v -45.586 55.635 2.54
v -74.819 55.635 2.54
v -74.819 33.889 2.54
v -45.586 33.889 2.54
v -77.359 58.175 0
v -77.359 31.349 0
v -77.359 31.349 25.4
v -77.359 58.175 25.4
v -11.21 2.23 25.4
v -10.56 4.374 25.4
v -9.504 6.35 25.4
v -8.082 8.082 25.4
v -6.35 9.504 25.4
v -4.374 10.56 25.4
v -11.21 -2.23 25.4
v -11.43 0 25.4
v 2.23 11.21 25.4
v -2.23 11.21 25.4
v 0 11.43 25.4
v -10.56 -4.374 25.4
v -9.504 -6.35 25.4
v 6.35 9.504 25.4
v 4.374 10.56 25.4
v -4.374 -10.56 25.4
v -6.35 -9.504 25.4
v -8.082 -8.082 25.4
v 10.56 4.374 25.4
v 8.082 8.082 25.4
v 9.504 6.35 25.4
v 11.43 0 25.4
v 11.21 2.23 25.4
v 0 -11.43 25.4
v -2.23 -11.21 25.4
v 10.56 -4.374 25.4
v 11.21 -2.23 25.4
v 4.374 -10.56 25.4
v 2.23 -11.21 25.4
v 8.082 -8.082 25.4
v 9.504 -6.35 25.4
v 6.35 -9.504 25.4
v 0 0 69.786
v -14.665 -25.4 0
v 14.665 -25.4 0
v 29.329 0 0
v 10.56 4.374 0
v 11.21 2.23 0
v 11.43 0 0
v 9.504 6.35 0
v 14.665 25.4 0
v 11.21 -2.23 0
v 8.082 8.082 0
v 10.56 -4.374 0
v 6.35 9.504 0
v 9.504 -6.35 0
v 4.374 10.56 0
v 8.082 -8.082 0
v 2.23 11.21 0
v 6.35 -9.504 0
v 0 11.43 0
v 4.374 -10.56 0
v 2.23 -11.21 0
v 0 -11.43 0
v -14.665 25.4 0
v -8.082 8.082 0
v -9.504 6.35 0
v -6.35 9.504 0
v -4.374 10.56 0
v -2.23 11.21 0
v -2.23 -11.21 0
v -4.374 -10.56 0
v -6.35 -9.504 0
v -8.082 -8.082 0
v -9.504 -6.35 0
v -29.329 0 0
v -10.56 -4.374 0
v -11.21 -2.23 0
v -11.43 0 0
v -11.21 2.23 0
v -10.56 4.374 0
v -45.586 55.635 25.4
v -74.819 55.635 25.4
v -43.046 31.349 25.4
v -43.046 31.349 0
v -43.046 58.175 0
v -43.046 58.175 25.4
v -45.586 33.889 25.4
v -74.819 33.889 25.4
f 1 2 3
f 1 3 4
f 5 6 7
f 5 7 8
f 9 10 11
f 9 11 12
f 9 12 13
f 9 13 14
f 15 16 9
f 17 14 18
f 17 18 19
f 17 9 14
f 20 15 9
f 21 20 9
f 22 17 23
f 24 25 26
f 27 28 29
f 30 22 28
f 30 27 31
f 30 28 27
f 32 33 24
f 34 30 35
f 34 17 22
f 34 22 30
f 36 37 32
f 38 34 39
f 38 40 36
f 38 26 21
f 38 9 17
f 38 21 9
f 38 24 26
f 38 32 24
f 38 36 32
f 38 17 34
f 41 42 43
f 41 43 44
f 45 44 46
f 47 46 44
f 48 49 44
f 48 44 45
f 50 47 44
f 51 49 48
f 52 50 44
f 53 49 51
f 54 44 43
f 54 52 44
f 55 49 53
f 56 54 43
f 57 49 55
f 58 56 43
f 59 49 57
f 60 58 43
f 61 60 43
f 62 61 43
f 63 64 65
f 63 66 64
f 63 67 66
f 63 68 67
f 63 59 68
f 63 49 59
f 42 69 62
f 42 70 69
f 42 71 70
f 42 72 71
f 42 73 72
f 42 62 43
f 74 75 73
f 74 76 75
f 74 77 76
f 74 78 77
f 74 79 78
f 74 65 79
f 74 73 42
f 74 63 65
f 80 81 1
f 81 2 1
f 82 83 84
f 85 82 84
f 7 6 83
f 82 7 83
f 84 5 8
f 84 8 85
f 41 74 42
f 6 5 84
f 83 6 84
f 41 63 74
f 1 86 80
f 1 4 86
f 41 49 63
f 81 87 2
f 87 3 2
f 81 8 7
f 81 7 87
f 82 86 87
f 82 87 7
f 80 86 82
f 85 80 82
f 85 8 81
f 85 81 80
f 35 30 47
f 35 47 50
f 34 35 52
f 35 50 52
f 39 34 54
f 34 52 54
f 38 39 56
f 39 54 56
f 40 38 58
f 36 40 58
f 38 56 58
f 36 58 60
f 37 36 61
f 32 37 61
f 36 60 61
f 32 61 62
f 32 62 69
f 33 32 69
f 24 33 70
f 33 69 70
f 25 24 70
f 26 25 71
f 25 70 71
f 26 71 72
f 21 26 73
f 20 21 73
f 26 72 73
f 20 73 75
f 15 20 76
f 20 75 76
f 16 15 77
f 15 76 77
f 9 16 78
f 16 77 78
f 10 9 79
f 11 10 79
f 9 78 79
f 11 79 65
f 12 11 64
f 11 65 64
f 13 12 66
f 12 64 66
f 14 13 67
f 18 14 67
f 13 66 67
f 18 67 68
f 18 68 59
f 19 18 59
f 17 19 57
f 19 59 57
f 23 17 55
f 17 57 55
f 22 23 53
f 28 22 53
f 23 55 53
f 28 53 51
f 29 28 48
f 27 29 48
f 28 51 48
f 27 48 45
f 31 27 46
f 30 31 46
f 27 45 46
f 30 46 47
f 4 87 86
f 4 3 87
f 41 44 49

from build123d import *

# Parameters (mm, degrees)
F0_W     = 50.8
F0_H     = 50.8
F1_DEPTH = 53.975
F5_R     = 11.43
F6_DEPTH = 25.4
F7_W     = 34.3122780323
F7_H     = 26.8259719014
F8_DEPTH = 25.4
F9_T     = -2.54


# Not quite as in the source:
# - an extrude whose draft closes it to a point is written as a loft to that point


with BuildPart() as f1:
    # F0 (on Front) → F1 (new body, symmetric)
    with BuildSketch(Plane.XZ):
        with Locations((-25.4, 25.4)):
            Rectangle(F0_W, F0_H)
    extrude(amount=F1_DEPTH, both=True)


with BuildPart() as f4:
    # F3 (on Top) → F4 section 0
    with BuildSketch(Plane.XY, mode=Mode.PRIVATE) as f4_s0:
        Polygon((14.6646968374, 25.4), (-14.6646968374, 25.4), (-29.3293936748, 0), (-14.6646968374, -25.4), (14.6646968374, -25.4), (29.3293936748, 0), align=None)
    loft([f4_s0.sketch, Vertex(0, 0, 69.7859264541)], ruled=True)

    # F5 (on face) → F6 (cut)
    with BuildSketch(Plane(origin=(0, 0, 0), x_dir=(1, 0, 0), z_dir=(0, 0, -1))):
        Circle(F5_R)
    extrude(amount=-F6_DEPTH, mode=Mode.SUBTRACT)


with BuildPart() as f8:
    # F7 (on Top) → F8 (new body)
    with BuildSketch(Plane.XY):
        with Locations((-60.2024570107, 44.761929661)):
            Rectangle(F7_W, F7_H)
    extrude(amount=F8_DEPTH)

    # F9
    f9_openings = [f8.faces().sort_by_distance(p)[0] for p in [
        (-60.202457, 44.76193, 25.4),
    ]]
    offset(amount=F9_T, openings=f9_openings)


solid = Compound([f4.part, f8.part])
